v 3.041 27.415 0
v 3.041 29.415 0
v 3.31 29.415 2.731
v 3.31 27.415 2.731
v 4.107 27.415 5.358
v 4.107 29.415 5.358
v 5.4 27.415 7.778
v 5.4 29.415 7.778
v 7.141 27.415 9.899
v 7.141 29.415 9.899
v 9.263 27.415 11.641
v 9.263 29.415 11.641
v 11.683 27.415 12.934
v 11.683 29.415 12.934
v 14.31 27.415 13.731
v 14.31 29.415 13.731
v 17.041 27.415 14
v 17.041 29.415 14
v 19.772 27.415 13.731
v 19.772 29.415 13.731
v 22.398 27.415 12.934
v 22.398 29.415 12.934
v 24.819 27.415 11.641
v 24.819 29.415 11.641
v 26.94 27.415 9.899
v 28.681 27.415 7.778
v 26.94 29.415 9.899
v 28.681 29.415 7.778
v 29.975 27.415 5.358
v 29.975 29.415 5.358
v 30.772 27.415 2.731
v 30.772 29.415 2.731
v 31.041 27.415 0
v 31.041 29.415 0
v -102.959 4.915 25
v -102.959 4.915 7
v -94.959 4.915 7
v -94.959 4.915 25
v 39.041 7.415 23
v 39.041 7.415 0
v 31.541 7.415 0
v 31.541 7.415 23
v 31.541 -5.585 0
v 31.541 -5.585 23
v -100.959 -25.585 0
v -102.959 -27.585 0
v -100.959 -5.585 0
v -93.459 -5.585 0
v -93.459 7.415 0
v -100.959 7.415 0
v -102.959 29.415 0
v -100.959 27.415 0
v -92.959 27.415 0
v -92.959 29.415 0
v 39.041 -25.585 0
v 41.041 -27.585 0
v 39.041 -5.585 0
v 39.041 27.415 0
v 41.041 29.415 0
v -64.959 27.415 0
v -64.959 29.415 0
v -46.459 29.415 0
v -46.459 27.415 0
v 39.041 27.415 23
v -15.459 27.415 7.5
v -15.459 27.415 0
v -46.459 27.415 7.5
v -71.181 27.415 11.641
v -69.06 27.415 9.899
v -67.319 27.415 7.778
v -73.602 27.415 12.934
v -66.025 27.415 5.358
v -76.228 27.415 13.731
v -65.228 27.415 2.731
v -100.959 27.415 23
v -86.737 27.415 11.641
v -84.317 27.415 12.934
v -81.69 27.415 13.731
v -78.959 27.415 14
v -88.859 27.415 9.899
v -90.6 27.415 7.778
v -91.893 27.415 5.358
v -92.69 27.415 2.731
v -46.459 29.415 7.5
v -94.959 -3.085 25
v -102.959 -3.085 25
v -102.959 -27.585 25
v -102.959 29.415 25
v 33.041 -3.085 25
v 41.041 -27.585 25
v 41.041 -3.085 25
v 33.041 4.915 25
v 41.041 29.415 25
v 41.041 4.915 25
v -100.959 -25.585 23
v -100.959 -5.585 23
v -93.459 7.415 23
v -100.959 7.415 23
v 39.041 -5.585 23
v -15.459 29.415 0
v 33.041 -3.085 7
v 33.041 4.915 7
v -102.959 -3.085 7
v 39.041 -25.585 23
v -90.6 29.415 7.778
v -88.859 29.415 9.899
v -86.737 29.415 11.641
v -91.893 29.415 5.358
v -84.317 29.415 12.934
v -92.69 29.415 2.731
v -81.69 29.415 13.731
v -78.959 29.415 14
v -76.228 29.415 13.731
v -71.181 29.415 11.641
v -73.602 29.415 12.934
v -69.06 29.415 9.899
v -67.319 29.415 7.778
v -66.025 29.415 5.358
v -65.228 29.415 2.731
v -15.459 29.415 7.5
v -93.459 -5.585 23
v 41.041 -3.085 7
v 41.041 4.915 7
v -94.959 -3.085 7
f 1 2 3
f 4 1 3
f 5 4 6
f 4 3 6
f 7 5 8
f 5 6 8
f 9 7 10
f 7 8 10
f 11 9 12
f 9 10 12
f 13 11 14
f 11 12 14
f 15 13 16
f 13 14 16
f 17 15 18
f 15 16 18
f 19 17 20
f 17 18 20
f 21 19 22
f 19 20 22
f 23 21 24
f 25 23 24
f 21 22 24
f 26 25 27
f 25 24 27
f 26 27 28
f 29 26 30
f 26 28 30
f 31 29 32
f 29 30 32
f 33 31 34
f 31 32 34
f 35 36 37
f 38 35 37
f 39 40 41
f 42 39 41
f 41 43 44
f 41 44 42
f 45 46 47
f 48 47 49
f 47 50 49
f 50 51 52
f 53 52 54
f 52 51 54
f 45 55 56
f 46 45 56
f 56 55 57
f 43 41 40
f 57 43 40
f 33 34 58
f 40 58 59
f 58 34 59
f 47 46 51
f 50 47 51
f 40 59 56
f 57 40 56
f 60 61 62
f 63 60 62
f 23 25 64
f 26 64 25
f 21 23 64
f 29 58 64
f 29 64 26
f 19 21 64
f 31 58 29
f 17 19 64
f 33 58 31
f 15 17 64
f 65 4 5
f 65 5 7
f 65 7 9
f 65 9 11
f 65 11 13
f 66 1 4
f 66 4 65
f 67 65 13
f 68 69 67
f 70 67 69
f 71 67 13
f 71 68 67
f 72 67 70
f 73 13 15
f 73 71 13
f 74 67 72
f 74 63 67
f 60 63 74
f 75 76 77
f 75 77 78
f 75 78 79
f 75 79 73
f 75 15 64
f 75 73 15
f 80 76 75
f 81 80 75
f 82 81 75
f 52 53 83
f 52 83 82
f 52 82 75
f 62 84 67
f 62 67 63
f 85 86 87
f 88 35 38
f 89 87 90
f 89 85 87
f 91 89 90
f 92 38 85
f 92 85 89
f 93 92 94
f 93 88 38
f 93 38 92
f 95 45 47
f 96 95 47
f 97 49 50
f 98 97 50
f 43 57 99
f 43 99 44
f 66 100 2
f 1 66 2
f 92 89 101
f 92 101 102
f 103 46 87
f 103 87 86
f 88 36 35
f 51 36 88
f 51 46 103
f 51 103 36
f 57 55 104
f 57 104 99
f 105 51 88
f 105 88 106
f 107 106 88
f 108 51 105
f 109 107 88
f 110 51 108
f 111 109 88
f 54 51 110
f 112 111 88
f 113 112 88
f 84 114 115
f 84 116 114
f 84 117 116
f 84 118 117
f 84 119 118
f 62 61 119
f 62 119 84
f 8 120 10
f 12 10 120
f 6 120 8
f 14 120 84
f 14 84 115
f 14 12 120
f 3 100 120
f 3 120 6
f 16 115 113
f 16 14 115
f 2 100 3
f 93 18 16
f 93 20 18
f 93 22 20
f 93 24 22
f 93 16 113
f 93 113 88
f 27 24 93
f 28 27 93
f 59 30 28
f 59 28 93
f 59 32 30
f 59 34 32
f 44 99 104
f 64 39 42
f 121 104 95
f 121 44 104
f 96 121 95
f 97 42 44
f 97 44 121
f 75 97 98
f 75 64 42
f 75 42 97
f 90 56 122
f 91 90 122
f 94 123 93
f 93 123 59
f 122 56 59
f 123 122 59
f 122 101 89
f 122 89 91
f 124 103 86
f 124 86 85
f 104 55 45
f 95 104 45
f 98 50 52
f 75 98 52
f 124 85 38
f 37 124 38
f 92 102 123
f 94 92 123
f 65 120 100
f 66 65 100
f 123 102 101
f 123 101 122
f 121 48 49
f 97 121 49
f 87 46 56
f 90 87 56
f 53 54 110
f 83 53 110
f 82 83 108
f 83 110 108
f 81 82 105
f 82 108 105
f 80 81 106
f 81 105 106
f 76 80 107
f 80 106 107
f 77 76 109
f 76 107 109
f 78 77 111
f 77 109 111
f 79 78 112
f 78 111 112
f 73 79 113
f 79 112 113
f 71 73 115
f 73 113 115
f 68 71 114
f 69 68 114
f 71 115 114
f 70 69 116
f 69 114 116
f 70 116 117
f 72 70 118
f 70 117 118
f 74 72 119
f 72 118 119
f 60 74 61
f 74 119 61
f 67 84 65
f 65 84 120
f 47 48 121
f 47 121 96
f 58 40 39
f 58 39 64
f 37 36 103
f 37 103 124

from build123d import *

# Parameters (mm, degrees)
SKIZZE1_W                       = 144
SKIZZE1_H                       = 57
AUFSATZ_LINEAR_AUSTRAGEN1_DEPTH = 25
SKIZZE2_W                       = 8
SKIZZE2_H                       = 8
SCHNITT_LINEAR_AUSTRAGEN4_DEPTH = 18
SKIZZE5_W                       = 140
SKIZZE5_H                       = 20
SKIZZE5_W_2                     = 125
SKIZZE5_H_2                     = 13
SCHNITT_LINEAR_AUSTRAGEN5_DEPTH = 23
SKIZZE6_R                       = 14
SKIZZE6_W                       = 31
SKIZZE6_H                       = 7.5
SCHNITT_LINEAR_AUSTRAGEN6_DEPTH = 2


with BuildPart() as part:
    # Skizze1 → Aufsatz-Linear austragen1 (new body)
    with BuildSketch(Plane.XY):
        with Locations((-30.959148289, 0.914772727)):
            Rectangle(SKIZZE1_W, SKIZZE1_H)
    extrude(amount=AUFSATZ_LINEAR_AUSTRAGEN1_DEPTH)

    # Skizze2 → Schnitt-Linear austragen4 (cut)
    with BuildSketch(Plane.XY.offset(25)):
        with Locations((37.040851711, 0.914772727)):
            Rectangle(SKIZZE2_W, SKIZZE2_H)
        with Locations((-98.959148289, 0.914772727)):
            Rectangle(SKIZZE2_W, SKIZZE2_H)
    extrude(amount=-SCHNITT_LINEAR_AUSTRAGEN4_DEPTH, mode=Mode.SUBTRACT)

    # Skizze5 → Schnitt-Linear austragen5 (cut)
    with BuildSketch(Plane(origin=(0, 0, 0), x_dir=(-1, 0, 0), z_dir=(0, 0, -1))):
        with Locations((30.959148289, 17.414772727)):
            Rectangle(SKIZZE5_W, SKIZZE5_H)
        with Locations((30.959148289, 0.914772727)):
            Rectangle(SKIZZE5_W_2, SKIZZE5_H_2)
        with Locations((30.959148289, -15.585227273)):
            Rectangle(SKIZZE5_W, SKIZZE5_H)
    extrude(amount=-SCHNITT_LINEAR_AUSTRAGEN5_DEPTH, mode=Mode.SUBTRACT)

    # Skizze6 → Schnitt-Linear austragen6 (cut)
    with BuildSketch(Plane(origin=(0, 29.414772727, 0), x_dir=(1, 0, 0), z_dir=(0, 1, 0))):
        with Locations((17.040851711, 0)):
            Circle(SKIZZE6_R)
        with Locations((-78.959148289, 0)):
            Circle(SKIZZE6_R)
        with Locations((-30.959148289, -3.75)):
            Rectangle(SKIZZE6_W, SKIZZE6_H)
    extrude(amount=-SCHNITT_LINEAR_AUSTRAGEN6_DEPTH, mode=Mode.SUBTRACT)


solid = part.part
